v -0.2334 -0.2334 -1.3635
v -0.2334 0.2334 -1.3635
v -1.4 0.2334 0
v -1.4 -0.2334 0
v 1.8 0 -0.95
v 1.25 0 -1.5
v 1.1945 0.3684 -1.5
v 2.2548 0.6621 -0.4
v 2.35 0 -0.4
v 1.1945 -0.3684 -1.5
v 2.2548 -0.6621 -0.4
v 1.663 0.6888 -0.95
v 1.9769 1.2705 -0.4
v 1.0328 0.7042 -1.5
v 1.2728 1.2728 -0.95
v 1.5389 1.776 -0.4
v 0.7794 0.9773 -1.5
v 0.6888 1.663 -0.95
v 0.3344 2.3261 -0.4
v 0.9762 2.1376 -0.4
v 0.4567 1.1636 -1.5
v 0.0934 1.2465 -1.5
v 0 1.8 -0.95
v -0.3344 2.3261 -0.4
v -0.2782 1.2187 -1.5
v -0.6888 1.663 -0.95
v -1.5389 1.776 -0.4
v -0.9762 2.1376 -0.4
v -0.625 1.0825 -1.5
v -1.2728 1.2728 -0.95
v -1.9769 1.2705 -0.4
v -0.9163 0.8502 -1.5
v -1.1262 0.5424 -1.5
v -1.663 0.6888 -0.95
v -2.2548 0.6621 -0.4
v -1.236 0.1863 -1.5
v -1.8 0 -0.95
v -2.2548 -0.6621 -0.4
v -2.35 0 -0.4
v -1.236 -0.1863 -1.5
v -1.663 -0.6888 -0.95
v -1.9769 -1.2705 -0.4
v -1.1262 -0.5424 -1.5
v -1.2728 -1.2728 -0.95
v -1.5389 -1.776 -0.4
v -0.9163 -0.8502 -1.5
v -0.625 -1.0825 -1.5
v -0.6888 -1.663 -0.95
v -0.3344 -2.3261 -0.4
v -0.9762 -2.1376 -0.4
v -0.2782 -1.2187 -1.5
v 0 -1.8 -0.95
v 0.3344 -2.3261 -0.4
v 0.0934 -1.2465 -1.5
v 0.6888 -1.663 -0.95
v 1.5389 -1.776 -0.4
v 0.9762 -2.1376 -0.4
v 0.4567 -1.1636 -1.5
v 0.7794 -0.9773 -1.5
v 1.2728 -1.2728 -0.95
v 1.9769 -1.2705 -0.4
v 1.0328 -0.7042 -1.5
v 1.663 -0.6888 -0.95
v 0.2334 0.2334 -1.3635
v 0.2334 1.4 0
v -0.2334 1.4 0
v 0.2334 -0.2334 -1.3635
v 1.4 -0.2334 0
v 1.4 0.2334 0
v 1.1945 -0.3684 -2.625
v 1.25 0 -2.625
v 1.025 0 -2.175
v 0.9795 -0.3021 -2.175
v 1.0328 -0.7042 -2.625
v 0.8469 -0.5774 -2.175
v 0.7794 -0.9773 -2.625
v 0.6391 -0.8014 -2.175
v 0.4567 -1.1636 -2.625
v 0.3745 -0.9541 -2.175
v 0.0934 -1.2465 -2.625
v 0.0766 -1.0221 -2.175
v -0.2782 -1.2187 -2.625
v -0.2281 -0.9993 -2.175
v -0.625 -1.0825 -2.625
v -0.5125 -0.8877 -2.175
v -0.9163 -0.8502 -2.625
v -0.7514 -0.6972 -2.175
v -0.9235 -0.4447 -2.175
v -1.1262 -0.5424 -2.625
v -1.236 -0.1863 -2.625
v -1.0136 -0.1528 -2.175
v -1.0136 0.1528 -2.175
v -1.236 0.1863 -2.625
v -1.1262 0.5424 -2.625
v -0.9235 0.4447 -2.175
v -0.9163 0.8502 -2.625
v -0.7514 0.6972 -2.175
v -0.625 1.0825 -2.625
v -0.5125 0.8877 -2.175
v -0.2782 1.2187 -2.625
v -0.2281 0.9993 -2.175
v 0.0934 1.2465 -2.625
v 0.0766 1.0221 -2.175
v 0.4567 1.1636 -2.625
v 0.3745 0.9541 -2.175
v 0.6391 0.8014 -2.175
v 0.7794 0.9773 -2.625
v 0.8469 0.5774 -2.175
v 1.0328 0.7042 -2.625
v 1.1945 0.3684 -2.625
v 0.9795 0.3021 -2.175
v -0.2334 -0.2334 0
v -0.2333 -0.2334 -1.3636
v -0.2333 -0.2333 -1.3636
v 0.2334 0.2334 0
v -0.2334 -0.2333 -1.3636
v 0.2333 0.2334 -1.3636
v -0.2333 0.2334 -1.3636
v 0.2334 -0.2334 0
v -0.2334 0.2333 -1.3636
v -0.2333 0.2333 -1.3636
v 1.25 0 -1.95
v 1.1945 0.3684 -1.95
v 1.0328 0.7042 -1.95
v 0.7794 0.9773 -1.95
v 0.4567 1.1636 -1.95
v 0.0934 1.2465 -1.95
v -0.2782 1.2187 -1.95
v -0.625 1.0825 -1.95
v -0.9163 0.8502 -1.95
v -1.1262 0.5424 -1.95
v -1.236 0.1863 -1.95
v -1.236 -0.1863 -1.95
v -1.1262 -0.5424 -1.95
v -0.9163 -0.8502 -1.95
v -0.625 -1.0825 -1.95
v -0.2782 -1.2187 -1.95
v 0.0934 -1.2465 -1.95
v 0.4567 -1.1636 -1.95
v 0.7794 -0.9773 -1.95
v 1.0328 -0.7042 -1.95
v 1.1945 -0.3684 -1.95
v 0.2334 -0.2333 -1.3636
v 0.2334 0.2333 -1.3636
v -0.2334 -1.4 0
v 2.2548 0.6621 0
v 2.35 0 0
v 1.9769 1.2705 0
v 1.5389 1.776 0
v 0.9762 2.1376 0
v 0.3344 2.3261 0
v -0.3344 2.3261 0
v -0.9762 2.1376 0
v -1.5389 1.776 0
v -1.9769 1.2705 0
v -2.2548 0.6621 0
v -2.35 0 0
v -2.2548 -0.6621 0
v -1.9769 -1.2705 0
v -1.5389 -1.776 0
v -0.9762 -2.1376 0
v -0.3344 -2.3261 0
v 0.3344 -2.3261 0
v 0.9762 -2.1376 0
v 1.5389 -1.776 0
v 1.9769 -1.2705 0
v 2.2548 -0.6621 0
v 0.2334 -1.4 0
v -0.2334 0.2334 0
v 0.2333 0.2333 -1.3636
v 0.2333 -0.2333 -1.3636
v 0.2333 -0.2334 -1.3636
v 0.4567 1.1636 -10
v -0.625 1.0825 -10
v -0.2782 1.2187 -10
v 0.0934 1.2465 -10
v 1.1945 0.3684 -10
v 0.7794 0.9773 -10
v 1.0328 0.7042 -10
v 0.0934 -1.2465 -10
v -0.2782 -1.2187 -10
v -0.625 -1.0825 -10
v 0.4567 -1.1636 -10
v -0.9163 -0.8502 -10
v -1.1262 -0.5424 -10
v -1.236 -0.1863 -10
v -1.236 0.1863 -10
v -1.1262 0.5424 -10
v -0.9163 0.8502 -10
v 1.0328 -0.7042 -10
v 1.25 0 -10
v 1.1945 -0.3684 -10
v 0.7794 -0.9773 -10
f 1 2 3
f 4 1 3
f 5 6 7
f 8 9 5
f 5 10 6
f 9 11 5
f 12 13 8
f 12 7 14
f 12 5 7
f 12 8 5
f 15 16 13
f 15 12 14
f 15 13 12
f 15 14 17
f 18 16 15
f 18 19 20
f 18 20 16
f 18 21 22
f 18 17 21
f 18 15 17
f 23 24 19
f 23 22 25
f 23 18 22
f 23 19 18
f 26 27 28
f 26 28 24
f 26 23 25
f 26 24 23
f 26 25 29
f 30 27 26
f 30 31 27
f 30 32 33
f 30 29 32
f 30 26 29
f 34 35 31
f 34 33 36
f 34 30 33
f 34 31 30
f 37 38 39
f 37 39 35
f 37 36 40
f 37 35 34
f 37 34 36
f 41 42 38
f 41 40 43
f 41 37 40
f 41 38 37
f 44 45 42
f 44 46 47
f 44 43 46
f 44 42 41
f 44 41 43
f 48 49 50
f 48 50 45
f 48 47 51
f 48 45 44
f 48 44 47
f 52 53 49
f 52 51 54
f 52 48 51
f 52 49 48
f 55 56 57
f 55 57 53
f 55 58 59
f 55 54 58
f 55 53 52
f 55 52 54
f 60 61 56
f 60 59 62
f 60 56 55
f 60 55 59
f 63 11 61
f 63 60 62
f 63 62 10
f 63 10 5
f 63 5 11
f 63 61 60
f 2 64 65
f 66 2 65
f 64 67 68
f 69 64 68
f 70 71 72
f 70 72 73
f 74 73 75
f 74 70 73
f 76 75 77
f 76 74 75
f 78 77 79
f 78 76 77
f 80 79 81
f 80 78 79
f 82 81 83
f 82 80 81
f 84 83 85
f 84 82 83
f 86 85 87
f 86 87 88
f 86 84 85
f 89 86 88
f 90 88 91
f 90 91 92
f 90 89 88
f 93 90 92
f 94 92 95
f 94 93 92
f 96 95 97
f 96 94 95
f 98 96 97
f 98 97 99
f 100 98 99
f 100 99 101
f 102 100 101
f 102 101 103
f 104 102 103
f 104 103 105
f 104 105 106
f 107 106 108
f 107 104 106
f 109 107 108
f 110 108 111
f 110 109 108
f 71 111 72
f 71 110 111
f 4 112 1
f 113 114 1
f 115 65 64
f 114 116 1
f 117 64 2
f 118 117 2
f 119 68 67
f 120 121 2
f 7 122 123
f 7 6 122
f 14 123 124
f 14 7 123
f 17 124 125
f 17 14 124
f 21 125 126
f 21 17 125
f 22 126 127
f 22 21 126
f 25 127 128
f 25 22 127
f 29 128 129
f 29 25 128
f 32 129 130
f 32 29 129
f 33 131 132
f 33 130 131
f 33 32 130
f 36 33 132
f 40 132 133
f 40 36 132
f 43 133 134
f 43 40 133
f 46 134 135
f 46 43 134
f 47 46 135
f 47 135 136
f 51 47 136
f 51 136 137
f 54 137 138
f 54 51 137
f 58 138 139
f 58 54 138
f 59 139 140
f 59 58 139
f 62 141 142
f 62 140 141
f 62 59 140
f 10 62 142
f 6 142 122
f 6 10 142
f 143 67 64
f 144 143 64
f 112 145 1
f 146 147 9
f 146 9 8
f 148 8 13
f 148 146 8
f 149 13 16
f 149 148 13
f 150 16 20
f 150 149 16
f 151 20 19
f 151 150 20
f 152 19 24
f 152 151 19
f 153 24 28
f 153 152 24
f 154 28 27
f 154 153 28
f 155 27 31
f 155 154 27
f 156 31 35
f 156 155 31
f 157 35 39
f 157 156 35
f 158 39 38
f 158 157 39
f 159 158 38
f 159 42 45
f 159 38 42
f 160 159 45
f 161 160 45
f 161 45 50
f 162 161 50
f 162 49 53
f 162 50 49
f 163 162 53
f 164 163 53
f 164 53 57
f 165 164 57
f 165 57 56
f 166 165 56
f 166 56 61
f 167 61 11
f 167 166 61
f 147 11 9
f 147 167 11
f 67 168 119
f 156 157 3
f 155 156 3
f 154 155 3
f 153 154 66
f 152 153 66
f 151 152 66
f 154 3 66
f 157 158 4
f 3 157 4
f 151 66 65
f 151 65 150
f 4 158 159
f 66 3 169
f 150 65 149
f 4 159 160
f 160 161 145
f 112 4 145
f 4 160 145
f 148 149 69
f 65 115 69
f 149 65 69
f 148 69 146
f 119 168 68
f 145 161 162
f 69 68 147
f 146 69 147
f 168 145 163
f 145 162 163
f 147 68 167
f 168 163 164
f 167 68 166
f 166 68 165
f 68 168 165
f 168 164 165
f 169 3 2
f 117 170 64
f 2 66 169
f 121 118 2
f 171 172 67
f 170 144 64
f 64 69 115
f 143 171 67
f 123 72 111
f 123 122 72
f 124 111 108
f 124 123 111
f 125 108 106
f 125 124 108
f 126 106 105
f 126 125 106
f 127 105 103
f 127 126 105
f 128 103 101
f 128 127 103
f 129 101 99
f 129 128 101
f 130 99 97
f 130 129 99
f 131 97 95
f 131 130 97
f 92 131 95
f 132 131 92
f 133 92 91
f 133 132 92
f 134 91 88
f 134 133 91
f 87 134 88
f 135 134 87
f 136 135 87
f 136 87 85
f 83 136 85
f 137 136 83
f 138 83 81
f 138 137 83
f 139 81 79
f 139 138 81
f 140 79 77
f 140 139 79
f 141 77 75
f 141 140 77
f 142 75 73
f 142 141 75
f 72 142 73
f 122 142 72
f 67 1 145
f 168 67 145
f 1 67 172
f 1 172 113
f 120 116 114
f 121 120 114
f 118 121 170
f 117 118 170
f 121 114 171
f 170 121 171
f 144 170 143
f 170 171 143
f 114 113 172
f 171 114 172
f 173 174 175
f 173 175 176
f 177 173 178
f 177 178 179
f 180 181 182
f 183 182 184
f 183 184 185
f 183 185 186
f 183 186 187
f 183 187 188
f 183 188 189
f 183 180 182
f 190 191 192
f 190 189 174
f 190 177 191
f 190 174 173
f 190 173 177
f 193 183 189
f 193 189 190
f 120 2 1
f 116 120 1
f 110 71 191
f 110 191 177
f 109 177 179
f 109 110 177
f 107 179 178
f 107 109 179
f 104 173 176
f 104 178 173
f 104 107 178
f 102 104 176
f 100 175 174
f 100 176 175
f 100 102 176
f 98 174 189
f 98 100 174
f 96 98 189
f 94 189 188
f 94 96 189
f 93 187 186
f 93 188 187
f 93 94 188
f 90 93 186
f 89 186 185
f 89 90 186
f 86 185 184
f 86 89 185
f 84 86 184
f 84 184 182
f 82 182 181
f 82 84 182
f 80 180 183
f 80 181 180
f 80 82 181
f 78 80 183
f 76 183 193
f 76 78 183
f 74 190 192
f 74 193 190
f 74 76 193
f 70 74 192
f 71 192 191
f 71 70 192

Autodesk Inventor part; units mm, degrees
ref_plane "YZ Plane" through (0, 0, 0) normal (1, 0, 0) x (0, 1, 0)
sketch "Skizze1" plane through (0, 0, 0) normal (0, 1, 0) x (-1, 0, 0)
  point P0 (0, 0)
sketch "Skizze2" plane through (0, 0, 0) normal (0, 0, 1) x (1, 0, 0)
  point P0 (0, 0)
sketch "Skizze3" plane through (0, 0, 0) normal (0, 1, 0) x (-1, 0, 0)
  line L0 (-2.35, 0) -> (0, 0)
  line L1 (-2.35, -0.4) -> (-2.35, 0)
  line L2 (-1.25, -1.5) -> (-2.35, -0.4)
  line L3 (-1.25, -1.95) -> (-1.25, -1.5)
  line L4 (-1.025, -2.175) -> (-1.25, -1.95)
  line L5 (-1.25, -2.625) -> (-1.025, -2.175)
  line L6 (-1.25, -10) -> (-1.25, -2.625)
  line L7 (0, 0) -> (0, -10)
  line L8 (0, 3.3392) -> (0, -10.6608) construction
  line L9 (0, 3.3392) -> (0, -10.6608)
  line L10 (0, -13.4608) -> (0, 6.1392) projected
  line L11 (-1.25, -10) -> (0, -10)
  line L12 (0.47, 0) -> (-2.82, 0) projected
  dimension "d3" = 2.35
  dimension "d5" = 0.45
  dimension "d7" = 0.225
  dimension "d9" = 0.45
  dimension "d11" = 1.5
  dimension "d13" = 135
  dimension "d15" = 10
  dimension "d17" = 1.025
  dimension "d19" = 0
  dimension "d41" = 1.25
revolve "Drehung1" add sketch "Skizze3" angle 360 about axis through (0, 0, 3.3392) along (0, 0, -1)
sketch "Skizze4" plane through (0, 0, 0) normal (0, 1, 0) x (-1, 0, 0)
  line L0 (-1.4, 0) -> (0, 0)
  line L1 (-0.2333, -1.3636) -> (-1.4, 0)
  line L2 (0, -1.3636) -> (-0.2333, -1.3636)
  line L3 (0, 0) -> (0, -1.3636)
  line L4 (-1.25, -1.5) -> (1.25, -1.5) construction
  line L5 (-2.35, 0) -> (2.35, 0) projected
  line L6 (0, -1.8) -> (0, 0.3) projected
  dimension "d22" = 1.4
  dimension "d24" = 0.2333
  dimension "d26" = 1.3636
extrude "Extrusion1" cut sketch "Skizze4" along normal mid plane 0.4667
pattern_circular "Polare Anordnung1" count 4 over 360 about axis through (0, 0, 0) along (0, 0, 1) of "Extrusion1"
thread "Gewinde1" size "M2.5x0.45" class "6g" standard "ISO Metric profile" full length
ref_plane "MSC_PF1" through (0, 0, 0) normal (1, 0, 0) x (0, 1, 0)
ref_plane "MSC_PT1" through (0, 0, 0) normal (0, 0, -1) x (-1, 0, 0)
equation "\"d3\" = 0.5 * Dh"
equation "\"d5\" = msp_x"
equation "\"d7\" = ParA"
equation "\"d9\" = msp_x"
equation "\"d11\" = ParK"
equation "\"d15\" = NLG"
equation "\"d17\" = 0.5 * msp_mdtds"
equation "\"d41\" = 0.5 * NND"
equation "\"d22\" = 0.5 * M"
equation "\"d24\" = 0.0833333 * M"
equation "\"d26\" = 0.909091 * ParK"
equation "\"d27\" = 0.166667 * M"
equation "\"r\" = 0.6"
equation "\"PTC\" = 0.45"
equation "\"NLG\" = 10"
equation "\"ParK\" = 1.5"
equation "\"NND\" = 2.5"
equation "\"M\" = 2.8"
equation "\"Dh\" = 4.7"
equation "\"msp_c0\" = 4"
equation "\"msp_x\" = PTC"
equation "\"ParA\" = 0.5 * PTC"
equation "\"msp_mdtds\" = NND - PTC"
equation "\"THREADDIA\" = NND"
equation "\"TEMPLATE\" = 1.2345"
properties part number "DIN EN ISO 7046-2 Z - M2.5x10 - 8.8 - Z1" material "Stahl"
